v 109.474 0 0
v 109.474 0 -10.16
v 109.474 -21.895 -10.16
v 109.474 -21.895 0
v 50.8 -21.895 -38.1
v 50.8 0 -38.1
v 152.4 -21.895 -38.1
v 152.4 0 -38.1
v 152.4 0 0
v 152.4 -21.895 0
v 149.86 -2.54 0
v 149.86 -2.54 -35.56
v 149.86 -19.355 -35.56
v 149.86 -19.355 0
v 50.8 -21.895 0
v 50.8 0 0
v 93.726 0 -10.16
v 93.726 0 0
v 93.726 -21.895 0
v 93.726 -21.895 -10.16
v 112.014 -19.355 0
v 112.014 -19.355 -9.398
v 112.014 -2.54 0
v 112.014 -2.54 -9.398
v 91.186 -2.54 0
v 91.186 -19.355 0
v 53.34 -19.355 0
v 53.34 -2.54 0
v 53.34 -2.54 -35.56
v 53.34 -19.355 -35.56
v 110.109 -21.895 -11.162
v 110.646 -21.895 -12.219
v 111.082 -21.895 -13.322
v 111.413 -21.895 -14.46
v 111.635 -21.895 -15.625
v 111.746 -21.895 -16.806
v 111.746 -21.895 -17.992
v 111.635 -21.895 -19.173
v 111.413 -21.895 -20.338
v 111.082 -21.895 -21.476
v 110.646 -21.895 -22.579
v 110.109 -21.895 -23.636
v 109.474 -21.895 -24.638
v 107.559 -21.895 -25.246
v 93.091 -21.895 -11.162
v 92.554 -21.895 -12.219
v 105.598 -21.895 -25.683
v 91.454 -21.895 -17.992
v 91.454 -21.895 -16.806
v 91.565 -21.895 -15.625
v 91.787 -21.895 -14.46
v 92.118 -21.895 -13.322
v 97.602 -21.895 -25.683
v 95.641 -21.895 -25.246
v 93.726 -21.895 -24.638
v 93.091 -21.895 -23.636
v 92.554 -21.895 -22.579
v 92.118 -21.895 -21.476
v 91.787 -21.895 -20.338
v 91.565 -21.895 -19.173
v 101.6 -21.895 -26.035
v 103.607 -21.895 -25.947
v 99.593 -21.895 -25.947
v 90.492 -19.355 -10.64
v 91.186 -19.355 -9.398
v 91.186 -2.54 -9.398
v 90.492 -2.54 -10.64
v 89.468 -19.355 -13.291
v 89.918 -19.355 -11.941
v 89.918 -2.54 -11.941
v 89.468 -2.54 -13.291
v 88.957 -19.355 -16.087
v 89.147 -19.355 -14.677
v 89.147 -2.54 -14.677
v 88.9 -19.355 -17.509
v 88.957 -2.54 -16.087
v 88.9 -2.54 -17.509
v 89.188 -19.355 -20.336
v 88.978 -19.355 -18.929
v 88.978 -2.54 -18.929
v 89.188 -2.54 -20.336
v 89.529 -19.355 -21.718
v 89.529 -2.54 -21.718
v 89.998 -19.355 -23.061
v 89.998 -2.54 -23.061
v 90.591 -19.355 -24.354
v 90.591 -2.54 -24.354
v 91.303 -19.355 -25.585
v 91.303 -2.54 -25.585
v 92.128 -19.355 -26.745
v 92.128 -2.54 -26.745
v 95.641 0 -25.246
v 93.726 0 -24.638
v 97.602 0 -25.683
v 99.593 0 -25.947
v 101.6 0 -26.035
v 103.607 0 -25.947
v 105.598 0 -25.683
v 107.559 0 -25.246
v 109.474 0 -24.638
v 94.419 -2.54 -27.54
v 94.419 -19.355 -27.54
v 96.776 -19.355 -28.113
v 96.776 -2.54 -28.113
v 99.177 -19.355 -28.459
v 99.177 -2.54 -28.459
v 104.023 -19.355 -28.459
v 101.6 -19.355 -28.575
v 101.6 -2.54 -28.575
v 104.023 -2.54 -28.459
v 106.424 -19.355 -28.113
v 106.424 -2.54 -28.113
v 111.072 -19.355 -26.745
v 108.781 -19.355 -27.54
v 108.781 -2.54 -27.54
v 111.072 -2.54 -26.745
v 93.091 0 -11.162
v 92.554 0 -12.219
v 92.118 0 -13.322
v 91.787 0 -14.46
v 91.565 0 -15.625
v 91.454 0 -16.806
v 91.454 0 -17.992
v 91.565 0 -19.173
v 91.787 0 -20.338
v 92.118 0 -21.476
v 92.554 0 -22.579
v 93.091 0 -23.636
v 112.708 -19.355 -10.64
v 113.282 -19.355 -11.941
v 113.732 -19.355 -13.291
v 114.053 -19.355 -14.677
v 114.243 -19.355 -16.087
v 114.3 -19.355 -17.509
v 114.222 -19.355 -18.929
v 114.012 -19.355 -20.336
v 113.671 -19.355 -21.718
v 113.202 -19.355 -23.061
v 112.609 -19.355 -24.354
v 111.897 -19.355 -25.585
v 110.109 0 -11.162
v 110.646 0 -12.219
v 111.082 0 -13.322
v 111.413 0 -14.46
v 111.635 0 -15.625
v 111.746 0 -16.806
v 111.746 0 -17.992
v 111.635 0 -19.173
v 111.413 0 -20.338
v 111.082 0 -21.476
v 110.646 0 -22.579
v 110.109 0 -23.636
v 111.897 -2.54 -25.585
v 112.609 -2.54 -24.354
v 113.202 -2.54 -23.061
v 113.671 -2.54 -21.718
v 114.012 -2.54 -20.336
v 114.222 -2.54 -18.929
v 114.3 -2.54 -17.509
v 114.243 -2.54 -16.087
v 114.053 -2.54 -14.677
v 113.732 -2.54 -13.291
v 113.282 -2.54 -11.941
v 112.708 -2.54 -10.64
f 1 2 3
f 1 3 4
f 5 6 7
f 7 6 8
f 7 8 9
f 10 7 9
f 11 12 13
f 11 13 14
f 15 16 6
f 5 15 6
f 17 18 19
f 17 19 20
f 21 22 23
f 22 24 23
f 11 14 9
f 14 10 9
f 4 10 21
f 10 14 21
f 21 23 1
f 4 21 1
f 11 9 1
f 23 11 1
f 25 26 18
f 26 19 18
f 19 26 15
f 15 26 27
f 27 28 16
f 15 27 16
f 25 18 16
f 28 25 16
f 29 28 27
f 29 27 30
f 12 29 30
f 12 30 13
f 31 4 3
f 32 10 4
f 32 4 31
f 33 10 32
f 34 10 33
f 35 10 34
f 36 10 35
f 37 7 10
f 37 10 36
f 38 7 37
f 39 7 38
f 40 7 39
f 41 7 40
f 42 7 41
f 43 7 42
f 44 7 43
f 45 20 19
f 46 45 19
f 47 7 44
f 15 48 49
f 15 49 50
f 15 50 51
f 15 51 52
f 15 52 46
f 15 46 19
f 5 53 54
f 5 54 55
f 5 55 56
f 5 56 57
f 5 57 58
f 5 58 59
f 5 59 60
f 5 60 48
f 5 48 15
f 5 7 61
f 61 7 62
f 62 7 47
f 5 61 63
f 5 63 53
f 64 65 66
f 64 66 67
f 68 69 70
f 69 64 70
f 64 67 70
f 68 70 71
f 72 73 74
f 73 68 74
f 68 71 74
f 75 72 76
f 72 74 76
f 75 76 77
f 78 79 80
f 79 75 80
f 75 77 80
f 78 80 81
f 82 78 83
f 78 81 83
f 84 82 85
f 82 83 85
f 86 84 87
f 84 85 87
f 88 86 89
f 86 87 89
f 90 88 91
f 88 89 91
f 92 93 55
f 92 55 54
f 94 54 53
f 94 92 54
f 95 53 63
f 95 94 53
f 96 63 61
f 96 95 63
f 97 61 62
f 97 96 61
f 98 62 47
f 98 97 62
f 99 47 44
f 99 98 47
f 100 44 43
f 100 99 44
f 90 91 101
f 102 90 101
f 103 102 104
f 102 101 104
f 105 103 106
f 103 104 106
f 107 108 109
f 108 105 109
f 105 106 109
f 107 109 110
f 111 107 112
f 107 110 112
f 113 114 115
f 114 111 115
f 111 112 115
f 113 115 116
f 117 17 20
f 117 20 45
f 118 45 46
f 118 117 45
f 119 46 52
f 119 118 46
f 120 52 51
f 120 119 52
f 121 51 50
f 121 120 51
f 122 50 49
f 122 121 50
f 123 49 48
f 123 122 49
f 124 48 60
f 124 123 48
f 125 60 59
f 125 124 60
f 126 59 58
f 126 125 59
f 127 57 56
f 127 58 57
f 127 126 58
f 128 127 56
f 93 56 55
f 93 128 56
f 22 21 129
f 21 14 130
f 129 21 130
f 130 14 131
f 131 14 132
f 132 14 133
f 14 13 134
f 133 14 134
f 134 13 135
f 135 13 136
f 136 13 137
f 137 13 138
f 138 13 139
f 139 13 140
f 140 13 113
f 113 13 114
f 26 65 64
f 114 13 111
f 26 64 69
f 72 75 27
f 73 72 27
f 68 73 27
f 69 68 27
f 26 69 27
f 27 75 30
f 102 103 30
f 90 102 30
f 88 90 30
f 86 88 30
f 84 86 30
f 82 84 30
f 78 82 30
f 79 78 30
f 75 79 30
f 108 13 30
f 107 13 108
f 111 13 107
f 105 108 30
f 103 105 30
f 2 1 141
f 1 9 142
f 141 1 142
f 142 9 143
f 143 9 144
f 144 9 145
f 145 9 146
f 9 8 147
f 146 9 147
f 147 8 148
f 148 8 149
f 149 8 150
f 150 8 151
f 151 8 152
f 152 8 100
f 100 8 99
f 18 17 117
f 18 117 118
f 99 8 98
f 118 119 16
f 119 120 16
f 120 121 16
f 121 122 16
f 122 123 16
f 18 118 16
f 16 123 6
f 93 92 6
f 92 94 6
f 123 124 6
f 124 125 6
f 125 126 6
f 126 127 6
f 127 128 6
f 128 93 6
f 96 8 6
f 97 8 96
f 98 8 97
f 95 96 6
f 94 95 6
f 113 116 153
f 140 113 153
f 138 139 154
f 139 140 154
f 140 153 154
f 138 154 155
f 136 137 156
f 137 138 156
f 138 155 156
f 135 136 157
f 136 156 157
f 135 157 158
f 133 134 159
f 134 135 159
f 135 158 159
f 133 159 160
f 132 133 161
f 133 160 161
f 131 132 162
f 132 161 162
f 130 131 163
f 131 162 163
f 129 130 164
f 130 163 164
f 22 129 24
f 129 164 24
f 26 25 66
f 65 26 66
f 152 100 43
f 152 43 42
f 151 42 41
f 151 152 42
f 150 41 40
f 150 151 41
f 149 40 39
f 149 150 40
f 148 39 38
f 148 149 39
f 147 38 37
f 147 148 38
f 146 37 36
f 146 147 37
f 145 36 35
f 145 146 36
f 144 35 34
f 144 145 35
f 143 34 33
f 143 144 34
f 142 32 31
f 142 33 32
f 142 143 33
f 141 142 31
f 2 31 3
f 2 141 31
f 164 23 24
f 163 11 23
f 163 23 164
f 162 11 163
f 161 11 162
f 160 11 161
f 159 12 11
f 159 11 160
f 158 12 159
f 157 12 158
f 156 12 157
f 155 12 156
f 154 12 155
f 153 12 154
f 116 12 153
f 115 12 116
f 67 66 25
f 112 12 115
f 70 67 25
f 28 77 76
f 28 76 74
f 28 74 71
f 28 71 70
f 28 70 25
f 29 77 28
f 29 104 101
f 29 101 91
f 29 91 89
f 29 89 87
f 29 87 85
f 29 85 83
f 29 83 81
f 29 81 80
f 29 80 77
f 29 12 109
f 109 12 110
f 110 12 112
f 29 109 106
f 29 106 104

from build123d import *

# Parameters (mm, degrees)
F1_DEPTH = 21.8948
F3_DEPTH = 25.4
F4_T     = -2.54
F5_ANGLE = 180


with BuildPart() as f1:
    # F0 (on Front) → F1 (new body)
    with BuildSketch(Plane.XZ):
        Polygon((-50.8, 0), (0, 0), (50.8, 0), (50.8, 38.1), (-50.8, 38.1), align=None)
    extrude(amount=F1_DEPTH)

    # F2 (on Front) → F3 (cut)
    with BuildSketch(Plane.XZ):
        with BuildLine():
            ThreePointArc((-7.874, 24.638), (-10.16, 17.399), (-7.874, 10.16))
            Line((-7.874, 10.16), (-7.874, 0))
            Line((-7.874, 0), (7.874, 0))
            Line((7.874, 0), (7.874, 10.16))
            ThreePointArc((7.874, 10.16), (10.16, 17.399), (7.874, 24.638))
            ThreePointArc((7.874, 24.638), (0, 26.035), (-7.874, 24.638))
        make_face()
    extrude(amount=F3_DEPTH, mode=Mode.SUBTRACT)

    # F4
    f4_openings = [f1.faces().sort_by_distance(p)[0] for p in [
        (29.337, -10.9474, 0),
        (-29.337, -10.9474, 0),
    ]]
    offset(amount=F4_T, openings=f4_openings, kind=Kind.INTERSECTION)


with BuildPart() as f1_1:
    # F5: moved
    add(f1.part.rotate(Axis((50.8, -10.9474, 0), (0, 1, 0)), F5_ANGLE))


solid = f1_1.part
